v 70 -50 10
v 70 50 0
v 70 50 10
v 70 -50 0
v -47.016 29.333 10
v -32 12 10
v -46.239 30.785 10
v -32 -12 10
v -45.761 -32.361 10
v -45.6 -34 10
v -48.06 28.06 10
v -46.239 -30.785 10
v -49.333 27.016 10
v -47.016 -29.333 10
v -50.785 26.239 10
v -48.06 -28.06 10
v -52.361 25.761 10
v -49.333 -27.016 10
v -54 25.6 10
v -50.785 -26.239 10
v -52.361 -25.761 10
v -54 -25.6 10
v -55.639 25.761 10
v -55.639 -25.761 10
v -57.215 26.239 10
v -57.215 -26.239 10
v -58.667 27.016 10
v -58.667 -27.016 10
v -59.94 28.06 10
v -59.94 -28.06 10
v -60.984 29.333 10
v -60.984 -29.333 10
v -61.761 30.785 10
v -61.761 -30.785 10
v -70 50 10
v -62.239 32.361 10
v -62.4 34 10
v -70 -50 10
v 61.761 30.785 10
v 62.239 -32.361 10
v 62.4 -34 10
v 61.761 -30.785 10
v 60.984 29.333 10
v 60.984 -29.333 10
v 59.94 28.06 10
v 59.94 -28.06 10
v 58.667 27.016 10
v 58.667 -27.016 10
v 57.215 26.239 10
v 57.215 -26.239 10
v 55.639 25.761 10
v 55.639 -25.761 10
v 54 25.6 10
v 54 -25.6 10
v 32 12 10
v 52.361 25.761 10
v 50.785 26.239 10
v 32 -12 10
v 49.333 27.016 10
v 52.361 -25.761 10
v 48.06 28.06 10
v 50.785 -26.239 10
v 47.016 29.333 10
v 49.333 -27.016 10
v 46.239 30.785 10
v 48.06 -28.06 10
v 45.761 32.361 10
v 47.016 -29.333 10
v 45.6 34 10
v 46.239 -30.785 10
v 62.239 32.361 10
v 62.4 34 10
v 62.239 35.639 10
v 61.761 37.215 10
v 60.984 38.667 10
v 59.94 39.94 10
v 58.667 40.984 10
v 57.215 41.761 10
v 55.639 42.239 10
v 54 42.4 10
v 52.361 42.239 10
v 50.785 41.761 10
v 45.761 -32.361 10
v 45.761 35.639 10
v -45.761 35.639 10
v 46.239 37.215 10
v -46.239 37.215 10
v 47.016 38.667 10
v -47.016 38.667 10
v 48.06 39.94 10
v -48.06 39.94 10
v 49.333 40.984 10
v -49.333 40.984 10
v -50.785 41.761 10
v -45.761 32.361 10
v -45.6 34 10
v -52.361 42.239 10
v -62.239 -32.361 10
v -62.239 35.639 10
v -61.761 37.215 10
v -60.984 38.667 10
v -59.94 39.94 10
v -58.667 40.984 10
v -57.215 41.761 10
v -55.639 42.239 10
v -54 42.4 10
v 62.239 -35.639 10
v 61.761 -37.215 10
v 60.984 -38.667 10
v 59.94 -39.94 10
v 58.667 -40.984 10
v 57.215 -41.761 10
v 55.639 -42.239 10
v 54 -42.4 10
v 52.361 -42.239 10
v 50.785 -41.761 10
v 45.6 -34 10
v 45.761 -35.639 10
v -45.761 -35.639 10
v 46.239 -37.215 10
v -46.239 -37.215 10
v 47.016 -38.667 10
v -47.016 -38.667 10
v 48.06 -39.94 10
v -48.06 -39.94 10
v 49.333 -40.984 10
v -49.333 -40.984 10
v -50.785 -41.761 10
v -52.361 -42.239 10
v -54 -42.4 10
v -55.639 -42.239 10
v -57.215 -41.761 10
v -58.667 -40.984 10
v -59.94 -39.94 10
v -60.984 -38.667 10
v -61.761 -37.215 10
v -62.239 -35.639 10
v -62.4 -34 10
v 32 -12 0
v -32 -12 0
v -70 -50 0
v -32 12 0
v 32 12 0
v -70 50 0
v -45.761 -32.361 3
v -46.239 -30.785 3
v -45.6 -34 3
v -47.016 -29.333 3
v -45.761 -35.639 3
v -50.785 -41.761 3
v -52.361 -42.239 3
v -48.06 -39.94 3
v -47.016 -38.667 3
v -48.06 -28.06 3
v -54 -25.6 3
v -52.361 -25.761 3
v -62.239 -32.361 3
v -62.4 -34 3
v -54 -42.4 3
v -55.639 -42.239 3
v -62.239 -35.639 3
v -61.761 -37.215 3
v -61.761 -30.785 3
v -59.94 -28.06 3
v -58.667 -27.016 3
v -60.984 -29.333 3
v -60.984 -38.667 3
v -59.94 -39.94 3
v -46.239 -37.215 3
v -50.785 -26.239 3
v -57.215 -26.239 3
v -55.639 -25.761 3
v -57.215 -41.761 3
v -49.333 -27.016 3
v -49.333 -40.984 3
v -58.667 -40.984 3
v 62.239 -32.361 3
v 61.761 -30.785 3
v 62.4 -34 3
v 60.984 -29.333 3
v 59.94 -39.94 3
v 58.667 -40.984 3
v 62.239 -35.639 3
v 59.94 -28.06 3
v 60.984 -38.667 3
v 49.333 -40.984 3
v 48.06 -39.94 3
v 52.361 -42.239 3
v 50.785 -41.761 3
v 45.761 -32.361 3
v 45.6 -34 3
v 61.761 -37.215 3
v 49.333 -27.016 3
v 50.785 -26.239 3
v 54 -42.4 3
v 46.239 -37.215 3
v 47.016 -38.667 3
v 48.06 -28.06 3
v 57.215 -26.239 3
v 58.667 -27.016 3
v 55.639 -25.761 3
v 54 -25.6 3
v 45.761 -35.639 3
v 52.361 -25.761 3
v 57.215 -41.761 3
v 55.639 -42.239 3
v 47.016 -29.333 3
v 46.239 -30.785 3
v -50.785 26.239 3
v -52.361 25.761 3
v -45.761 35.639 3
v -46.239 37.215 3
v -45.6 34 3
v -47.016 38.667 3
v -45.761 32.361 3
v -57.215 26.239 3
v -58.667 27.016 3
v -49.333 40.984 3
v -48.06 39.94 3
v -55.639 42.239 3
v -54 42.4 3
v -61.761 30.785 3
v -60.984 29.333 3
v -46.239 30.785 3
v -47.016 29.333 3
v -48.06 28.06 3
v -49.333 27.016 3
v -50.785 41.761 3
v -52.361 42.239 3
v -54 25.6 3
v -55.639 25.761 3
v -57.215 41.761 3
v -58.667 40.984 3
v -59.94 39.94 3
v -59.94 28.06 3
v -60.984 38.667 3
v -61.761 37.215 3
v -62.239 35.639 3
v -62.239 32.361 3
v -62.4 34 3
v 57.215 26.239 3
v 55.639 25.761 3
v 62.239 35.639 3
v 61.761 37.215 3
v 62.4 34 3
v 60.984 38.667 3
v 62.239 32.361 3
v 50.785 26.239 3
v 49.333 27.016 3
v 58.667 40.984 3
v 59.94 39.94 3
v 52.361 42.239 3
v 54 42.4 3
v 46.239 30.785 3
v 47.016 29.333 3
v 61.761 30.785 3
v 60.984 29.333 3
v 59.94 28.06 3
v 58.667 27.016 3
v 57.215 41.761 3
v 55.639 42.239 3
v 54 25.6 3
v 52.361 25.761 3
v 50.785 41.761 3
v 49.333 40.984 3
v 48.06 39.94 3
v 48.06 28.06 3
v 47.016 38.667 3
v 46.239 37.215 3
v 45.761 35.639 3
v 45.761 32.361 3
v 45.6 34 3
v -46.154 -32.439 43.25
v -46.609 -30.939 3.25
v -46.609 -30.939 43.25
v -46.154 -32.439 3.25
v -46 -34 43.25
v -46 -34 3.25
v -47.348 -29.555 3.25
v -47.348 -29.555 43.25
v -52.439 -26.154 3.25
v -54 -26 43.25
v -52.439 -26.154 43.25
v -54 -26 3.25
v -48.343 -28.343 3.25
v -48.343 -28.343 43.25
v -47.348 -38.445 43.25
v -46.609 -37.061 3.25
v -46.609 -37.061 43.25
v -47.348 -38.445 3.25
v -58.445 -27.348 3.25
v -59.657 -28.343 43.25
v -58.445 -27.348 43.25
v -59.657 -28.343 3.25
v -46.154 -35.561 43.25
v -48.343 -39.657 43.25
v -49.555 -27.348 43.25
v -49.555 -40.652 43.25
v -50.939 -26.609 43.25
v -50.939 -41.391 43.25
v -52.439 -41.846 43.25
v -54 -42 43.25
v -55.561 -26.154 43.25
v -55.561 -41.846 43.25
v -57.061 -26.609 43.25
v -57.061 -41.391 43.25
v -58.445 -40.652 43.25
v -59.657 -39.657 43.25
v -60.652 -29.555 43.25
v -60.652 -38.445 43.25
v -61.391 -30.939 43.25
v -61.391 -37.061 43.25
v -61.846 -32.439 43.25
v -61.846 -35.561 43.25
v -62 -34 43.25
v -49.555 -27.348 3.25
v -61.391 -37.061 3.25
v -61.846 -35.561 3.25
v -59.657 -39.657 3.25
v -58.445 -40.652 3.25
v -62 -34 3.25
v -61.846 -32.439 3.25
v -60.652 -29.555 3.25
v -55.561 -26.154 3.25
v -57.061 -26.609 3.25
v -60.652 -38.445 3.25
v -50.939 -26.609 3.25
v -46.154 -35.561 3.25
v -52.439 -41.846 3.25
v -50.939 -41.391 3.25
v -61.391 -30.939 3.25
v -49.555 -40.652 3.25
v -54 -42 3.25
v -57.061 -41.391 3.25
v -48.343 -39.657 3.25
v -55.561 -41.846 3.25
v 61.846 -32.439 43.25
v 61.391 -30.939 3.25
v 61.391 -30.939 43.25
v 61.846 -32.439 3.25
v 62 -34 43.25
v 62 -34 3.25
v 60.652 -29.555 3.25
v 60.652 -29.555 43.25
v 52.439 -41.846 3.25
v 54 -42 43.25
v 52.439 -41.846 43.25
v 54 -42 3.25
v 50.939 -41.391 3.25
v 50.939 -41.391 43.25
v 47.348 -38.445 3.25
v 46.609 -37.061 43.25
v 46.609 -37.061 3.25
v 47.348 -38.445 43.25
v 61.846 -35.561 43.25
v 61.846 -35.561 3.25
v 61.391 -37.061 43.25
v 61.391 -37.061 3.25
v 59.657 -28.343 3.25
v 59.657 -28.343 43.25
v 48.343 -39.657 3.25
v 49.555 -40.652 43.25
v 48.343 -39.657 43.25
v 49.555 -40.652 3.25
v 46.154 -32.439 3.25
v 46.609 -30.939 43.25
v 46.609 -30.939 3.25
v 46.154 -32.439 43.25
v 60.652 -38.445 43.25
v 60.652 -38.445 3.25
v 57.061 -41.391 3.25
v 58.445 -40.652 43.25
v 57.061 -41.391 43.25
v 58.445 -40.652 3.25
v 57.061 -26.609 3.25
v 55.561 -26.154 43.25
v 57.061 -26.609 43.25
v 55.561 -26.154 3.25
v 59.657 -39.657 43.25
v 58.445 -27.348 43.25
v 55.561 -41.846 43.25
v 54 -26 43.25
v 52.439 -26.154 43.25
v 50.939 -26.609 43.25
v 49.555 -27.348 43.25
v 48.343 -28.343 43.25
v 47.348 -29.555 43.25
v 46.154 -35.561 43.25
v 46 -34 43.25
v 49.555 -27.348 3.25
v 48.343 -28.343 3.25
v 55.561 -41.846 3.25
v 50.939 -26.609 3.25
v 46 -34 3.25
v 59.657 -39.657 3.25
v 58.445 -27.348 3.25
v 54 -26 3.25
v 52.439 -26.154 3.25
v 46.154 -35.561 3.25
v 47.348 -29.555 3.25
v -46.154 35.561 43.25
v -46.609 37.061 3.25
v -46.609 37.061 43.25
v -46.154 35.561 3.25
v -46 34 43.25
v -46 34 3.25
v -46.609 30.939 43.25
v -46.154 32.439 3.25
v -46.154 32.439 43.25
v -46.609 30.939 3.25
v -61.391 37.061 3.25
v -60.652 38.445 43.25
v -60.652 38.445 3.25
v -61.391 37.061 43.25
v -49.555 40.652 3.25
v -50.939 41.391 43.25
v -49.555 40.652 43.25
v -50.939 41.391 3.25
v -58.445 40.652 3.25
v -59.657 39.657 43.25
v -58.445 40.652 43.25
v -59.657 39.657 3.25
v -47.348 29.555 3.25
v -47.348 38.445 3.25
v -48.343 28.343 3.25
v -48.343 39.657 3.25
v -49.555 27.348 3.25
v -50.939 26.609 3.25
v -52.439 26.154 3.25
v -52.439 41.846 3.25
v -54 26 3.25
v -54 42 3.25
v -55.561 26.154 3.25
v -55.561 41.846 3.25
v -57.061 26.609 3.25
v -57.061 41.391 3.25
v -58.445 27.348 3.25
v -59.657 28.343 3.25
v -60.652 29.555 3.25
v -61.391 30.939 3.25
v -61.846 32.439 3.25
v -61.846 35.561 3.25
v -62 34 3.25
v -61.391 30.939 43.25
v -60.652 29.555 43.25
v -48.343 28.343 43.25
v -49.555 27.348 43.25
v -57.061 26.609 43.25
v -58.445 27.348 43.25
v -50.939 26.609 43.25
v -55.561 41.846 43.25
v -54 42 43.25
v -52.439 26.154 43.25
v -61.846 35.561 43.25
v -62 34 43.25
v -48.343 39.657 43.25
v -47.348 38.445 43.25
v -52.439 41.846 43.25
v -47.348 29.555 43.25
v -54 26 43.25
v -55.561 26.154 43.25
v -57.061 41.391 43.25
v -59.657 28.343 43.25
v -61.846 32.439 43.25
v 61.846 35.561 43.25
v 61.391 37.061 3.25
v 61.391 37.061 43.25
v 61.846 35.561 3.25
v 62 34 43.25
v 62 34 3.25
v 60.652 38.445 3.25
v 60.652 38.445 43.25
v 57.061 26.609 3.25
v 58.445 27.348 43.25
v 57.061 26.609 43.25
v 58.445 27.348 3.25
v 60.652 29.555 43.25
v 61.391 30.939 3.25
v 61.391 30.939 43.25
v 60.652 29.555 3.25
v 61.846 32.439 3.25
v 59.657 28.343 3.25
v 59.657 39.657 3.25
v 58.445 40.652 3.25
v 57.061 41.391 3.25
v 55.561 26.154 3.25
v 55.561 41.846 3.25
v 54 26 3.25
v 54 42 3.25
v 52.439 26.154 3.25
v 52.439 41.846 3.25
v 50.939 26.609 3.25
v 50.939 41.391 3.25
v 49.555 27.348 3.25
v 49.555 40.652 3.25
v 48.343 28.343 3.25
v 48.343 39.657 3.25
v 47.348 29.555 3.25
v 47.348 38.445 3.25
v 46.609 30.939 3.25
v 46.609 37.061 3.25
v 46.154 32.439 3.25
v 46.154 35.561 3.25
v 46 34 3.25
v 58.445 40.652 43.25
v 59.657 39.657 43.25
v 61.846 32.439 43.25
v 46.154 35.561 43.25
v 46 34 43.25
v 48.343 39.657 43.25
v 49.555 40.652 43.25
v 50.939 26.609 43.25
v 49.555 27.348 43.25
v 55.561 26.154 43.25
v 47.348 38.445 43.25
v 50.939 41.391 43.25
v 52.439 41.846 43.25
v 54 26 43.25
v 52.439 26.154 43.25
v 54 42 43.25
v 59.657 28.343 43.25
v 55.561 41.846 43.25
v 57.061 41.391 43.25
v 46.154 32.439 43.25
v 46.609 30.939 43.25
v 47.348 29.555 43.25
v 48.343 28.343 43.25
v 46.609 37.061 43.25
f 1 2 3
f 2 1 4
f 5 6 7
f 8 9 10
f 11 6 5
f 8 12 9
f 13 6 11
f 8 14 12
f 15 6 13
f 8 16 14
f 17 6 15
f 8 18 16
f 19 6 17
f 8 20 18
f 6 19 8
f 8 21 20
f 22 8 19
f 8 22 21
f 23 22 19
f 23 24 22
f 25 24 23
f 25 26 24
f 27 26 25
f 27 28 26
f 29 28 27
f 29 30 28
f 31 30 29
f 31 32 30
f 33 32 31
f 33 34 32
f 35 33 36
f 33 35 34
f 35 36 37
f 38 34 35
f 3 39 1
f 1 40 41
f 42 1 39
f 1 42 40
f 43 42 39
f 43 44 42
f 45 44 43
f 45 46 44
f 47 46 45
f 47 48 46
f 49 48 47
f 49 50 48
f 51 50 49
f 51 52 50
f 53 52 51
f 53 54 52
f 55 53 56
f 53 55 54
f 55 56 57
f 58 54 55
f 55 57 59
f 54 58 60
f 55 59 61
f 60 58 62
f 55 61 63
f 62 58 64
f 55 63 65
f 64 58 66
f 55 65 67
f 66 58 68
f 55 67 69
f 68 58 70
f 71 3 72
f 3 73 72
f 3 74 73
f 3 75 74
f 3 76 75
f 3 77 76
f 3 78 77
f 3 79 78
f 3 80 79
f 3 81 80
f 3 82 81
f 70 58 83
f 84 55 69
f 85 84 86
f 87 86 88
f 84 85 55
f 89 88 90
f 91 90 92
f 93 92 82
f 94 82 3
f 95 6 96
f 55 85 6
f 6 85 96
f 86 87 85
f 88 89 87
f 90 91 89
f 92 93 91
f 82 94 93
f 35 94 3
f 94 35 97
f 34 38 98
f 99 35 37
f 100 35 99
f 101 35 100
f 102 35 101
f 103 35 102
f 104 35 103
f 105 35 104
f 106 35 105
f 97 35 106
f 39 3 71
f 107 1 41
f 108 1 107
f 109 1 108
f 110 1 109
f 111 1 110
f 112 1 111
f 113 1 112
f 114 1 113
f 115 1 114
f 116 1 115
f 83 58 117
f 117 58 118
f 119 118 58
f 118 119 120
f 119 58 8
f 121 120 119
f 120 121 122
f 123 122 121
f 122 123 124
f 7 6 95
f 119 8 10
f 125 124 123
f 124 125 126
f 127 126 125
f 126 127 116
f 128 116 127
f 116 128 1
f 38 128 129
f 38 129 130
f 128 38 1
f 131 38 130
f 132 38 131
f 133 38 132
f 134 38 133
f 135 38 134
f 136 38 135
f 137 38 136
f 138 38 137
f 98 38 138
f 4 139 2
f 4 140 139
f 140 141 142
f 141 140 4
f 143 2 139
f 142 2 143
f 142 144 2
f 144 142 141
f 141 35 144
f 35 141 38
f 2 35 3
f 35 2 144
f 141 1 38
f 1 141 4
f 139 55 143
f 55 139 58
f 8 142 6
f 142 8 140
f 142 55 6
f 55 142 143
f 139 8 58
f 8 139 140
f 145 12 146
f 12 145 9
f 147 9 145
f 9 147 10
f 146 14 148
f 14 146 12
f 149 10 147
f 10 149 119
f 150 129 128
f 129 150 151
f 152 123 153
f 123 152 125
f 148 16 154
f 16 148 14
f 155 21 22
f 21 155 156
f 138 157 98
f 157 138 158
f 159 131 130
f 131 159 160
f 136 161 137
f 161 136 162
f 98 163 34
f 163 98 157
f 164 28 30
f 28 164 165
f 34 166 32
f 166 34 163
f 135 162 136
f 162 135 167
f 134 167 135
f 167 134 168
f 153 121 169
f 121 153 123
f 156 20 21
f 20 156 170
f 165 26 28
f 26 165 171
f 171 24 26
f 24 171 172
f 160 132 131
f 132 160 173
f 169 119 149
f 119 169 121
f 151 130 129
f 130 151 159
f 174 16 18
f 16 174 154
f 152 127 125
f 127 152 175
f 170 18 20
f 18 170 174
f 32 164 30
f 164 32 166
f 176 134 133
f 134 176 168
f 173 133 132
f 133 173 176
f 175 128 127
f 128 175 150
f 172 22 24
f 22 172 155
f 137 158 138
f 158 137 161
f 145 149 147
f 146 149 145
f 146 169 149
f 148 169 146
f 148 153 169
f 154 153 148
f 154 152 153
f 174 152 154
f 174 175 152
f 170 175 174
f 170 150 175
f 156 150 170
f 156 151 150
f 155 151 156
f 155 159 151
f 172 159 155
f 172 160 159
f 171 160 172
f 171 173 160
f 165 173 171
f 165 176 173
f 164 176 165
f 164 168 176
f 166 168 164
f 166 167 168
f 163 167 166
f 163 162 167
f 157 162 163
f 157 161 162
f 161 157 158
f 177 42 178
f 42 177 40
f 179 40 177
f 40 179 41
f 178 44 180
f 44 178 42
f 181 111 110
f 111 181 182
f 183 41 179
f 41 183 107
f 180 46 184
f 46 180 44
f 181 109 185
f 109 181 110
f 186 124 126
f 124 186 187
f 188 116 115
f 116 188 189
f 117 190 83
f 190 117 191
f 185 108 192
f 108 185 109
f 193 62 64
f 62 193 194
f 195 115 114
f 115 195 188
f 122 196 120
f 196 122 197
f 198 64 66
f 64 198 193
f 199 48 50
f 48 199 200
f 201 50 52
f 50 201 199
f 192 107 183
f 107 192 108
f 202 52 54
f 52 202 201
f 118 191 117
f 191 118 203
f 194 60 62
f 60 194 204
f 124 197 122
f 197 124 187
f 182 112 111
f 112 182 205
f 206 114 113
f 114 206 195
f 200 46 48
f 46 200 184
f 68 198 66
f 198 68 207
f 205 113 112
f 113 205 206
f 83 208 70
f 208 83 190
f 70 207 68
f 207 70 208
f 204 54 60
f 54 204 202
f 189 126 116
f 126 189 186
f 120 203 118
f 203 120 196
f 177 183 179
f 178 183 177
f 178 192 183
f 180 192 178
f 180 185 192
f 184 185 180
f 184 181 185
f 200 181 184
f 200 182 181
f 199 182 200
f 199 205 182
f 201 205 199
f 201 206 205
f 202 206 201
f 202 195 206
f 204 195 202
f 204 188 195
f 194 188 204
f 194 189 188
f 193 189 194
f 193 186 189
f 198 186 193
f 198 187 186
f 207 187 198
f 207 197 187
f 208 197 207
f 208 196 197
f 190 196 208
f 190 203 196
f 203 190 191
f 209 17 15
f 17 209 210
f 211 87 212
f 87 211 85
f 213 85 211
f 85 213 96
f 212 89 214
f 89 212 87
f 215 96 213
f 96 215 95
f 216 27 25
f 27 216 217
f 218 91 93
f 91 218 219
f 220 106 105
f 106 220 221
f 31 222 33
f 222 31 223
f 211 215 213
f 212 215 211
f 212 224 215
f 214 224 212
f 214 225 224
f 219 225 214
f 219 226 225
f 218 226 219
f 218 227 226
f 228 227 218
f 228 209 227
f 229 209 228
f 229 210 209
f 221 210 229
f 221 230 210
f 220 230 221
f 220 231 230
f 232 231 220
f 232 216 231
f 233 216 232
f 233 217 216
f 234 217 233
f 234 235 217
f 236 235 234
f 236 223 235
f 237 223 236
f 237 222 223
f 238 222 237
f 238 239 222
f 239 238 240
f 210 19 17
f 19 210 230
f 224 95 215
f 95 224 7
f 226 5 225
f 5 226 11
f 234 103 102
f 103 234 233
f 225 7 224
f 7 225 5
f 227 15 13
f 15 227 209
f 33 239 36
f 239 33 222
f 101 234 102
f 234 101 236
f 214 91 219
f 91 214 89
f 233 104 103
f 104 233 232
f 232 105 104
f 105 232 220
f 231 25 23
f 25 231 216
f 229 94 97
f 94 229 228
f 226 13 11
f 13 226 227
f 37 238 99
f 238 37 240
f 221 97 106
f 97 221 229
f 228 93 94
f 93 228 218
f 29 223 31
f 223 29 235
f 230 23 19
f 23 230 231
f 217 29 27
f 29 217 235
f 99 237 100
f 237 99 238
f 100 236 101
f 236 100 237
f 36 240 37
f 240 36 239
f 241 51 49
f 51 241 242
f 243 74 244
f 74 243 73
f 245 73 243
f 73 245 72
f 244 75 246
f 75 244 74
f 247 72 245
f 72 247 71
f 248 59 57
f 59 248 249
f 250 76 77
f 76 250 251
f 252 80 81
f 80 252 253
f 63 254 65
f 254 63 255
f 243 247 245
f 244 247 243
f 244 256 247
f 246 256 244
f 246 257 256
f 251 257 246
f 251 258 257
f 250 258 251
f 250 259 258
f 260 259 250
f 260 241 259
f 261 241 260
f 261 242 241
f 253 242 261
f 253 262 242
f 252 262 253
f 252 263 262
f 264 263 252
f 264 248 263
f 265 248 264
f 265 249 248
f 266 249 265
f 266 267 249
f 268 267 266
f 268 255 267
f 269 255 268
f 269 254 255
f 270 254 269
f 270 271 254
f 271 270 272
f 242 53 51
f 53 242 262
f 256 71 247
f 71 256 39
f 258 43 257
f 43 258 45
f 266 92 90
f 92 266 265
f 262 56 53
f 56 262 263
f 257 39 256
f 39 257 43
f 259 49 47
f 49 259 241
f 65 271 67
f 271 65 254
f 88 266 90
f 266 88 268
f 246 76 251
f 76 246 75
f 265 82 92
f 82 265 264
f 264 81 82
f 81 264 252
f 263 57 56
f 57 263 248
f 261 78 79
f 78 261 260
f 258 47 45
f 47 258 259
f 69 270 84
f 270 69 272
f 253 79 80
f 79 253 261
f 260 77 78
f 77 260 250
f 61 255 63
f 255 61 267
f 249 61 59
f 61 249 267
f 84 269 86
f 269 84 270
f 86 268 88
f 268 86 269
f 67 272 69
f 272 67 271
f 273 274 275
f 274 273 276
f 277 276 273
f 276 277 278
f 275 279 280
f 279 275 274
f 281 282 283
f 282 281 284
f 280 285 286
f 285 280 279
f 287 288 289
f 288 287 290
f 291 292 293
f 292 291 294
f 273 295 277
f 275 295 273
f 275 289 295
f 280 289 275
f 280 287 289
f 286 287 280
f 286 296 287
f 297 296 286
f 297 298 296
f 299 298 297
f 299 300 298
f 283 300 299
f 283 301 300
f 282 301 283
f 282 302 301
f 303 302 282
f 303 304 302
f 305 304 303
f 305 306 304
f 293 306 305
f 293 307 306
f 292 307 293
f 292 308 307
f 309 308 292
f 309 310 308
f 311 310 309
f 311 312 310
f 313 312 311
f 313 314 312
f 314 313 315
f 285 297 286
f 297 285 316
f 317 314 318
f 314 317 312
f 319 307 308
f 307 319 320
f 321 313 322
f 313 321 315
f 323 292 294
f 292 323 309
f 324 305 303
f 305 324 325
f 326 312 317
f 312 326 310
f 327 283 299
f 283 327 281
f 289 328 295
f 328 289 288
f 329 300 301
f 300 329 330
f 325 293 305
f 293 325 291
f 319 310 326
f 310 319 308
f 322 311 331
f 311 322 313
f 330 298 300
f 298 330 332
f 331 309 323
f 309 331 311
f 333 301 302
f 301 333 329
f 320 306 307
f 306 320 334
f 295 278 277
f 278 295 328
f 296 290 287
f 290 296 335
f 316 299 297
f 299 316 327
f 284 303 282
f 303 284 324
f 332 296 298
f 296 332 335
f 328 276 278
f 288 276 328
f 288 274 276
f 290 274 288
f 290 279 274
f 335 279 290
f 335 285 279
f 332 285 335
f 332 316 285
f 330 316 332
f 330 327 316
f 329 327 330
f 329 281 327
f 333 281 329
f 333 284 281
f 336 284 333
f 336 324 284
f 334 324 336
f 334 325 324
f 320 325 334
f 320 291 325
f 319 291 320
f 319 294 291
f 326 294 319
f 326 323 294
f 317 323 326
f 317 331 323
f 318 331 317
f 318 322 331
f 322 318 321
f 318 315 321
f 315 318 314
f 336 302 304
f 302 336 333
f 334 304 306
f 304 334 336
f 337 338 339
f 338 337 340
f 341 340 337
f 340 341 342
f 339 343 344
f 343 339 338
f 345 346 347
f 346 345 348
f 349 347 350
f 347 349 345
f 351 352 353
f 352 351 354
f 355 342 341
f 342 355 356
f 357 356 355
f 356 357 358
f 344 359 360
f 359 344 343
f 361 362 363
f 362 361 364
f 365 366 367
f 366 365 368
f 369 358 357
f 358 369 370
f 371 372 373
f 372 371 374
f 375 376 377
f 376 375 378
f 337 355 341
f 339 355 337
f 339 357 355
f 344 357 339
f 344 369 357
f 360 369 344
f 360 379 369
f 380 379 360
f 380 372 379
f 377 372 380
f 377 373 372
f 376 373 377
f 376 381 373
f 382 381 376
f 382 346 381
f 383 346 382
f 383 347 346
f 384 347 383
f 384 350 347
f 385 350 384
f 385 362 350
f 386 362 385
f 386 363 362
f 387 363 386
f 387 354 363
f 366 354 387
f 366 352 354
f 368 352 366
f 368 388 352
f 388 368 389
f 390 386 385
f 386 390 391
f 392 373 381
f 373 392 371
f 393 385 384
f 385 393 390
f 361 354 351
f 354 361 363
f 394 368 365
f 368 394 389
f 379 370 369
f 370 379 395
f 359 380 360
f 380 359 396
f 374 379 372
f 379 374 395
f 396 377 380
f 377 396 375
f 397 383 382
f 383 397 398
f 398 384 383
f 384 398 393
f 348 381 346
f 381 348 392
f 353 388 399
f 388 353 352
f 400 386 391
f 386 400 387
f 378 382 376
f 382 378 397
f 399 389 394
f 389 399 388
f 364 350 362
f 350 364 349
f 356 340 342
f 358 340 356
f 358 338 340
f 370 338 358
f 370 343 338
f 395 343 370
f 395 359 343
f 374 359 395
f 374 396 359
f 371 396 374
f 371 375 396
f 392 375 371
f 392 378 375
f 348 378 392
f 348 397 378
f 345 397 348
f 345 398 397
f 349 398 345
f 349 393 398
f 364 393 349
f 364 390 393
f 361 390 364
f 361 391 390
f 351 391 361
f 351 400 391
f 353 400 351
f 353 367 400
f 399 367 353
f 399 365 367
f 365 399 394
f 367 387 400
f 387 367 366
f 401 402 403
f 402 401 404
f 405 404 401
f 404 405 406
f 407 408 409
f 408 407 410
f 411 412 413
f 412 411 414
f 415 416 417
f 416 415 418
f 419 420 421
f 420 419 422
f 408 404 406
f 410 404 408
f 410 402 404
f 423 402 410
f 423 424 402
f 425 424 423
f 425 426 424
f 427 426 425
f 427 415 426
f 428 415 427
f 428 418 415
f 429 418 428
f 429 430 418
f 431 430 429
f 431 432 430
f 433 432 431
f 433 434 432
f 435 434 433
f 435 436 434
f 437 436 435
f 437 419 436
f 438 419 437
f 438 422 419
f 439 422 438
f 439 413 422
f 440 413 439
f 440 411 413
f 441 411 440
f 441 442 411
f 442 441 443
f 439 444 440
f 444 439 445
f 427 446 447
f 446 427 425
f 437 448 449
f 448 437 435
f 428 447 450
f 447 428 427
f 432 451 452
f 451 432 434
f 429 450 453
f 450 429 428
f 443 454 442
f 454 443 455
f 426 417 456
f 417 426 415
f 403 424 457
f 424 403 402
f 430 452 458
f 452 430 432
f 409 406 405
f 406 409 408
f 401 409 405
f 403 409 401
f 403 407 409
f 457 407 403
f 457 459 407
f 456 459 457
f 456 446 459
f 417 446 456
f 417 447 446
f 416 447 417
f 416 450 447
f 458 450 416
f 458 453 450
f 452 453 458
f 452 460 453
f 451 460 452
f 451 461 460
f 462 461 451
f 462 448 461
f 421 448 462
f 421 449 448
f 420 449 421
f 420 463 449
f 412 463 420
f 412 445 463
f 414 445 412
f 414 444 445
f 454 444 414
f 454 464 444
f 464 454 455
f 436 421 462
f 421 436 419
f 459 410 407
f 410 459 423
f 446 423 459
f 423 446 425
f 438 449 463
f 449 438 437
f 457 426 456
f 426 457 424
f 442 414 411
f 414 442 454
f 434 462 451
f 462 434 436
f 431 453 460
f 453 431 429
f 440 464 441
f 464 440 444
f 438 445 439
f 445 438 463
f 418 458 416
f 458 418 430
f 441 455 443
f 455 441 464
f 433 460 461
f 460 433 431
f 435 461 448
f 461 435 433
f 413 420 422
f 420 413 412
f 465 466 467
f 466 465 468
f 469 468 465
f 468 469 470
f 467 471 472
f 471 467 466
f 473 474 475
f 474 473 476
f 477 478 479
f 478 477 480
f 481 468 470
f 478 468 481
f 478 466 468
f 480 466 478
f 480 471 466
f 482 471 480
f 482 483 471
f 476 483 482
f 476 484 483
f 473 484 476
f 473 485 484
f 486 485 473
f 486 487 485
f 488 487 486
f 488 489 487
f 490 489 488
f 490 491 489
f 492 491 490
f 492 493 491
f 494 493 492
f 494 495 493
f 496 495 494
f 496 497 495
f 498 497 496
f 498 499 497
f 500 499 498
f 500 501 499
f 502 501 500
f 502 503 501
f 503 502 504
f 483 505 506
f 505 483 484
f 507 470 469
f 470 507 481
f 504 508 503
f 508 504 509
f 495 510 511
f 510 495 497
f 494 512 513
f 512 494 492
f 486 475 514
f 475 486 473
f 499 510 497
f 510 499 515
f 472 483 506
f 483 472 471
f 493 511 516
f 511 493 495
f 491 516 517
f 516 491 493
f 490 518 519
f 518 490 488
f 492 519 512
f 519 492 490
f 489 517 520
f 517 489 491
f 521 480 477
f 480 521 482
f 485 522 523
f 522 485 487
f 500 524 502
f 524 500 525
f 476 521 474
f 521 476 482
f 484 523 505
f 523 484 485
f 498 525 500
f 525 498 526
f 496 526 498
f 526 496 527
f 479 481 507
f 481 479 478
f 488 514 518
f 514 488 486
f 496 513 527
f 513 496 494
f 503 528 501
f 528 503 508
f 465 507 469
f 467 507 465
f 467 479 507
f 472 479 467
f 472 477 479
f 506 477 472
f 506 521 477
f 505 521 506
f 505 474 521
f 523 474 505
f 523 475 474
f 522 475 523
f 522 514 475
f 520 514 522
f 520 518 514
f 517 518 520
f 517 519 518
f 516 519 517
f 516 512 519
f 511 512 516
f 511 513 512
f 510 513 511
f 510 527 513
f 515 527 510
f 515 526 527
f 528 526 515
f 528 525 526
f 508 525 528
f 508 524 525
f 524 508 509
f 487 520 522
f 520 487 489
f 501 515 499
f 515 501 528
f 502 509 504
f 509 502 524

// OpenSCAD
$fn = 32;

// ------------------------------------------------------------------------
// Frame with four posts: 140 x 100 mm frame, four d16 posts
// Every part is its own module, assembly() places them once.
// ------------------------------------------------------------------------

// --- part 1 ---
module base_frame() {
  difference() {
    translate([-70, -50, 0]) cube([140, 100, 10]);
    translate([-32, -12, -1]) cube([64, 24, 12]);
    translate([-54, -34, 3]) cylinder(h = 8, d = 16.8);
    translate([54, -34, 3]) cylinder(h = 8, d = 16.8);
    translate([-54, 34, 3]) cylinder(h = 8, d = 16.8);
    translate([54, 34, 3]) cylinder(h = 8, d = 16.8);
  }
}

// --- part 2 ---
module post1() {
  cylinder(h = 40, d = 16);
}

// --- part 3 ---
module post2() {
  cylinder(h = 40, d = 16);
}

// --- part 4 ---
module post3() {
  cylinder(h = 40, d = 16);
}

// --- part 5 ---
module post4() {
  cylinder(h = 40, d = 16);
}

// --- assembly ---
module assembly() {
  translate([0, 0, 0]) rotate([0, 0, 0]) base_frame();
  translate([-54, -34, 3.25]) rotate([0, 0, 0]) post1();
  translate([54, -34, 3.25]) rotate([0, 0, 0]) post2();
  translate([-54, 34, 3.25]) rotate([0, 0, 0]) post3();
  translate([54, 34, 3.25]) rotate([0, 0, 0]) post4();
}

assembly();
